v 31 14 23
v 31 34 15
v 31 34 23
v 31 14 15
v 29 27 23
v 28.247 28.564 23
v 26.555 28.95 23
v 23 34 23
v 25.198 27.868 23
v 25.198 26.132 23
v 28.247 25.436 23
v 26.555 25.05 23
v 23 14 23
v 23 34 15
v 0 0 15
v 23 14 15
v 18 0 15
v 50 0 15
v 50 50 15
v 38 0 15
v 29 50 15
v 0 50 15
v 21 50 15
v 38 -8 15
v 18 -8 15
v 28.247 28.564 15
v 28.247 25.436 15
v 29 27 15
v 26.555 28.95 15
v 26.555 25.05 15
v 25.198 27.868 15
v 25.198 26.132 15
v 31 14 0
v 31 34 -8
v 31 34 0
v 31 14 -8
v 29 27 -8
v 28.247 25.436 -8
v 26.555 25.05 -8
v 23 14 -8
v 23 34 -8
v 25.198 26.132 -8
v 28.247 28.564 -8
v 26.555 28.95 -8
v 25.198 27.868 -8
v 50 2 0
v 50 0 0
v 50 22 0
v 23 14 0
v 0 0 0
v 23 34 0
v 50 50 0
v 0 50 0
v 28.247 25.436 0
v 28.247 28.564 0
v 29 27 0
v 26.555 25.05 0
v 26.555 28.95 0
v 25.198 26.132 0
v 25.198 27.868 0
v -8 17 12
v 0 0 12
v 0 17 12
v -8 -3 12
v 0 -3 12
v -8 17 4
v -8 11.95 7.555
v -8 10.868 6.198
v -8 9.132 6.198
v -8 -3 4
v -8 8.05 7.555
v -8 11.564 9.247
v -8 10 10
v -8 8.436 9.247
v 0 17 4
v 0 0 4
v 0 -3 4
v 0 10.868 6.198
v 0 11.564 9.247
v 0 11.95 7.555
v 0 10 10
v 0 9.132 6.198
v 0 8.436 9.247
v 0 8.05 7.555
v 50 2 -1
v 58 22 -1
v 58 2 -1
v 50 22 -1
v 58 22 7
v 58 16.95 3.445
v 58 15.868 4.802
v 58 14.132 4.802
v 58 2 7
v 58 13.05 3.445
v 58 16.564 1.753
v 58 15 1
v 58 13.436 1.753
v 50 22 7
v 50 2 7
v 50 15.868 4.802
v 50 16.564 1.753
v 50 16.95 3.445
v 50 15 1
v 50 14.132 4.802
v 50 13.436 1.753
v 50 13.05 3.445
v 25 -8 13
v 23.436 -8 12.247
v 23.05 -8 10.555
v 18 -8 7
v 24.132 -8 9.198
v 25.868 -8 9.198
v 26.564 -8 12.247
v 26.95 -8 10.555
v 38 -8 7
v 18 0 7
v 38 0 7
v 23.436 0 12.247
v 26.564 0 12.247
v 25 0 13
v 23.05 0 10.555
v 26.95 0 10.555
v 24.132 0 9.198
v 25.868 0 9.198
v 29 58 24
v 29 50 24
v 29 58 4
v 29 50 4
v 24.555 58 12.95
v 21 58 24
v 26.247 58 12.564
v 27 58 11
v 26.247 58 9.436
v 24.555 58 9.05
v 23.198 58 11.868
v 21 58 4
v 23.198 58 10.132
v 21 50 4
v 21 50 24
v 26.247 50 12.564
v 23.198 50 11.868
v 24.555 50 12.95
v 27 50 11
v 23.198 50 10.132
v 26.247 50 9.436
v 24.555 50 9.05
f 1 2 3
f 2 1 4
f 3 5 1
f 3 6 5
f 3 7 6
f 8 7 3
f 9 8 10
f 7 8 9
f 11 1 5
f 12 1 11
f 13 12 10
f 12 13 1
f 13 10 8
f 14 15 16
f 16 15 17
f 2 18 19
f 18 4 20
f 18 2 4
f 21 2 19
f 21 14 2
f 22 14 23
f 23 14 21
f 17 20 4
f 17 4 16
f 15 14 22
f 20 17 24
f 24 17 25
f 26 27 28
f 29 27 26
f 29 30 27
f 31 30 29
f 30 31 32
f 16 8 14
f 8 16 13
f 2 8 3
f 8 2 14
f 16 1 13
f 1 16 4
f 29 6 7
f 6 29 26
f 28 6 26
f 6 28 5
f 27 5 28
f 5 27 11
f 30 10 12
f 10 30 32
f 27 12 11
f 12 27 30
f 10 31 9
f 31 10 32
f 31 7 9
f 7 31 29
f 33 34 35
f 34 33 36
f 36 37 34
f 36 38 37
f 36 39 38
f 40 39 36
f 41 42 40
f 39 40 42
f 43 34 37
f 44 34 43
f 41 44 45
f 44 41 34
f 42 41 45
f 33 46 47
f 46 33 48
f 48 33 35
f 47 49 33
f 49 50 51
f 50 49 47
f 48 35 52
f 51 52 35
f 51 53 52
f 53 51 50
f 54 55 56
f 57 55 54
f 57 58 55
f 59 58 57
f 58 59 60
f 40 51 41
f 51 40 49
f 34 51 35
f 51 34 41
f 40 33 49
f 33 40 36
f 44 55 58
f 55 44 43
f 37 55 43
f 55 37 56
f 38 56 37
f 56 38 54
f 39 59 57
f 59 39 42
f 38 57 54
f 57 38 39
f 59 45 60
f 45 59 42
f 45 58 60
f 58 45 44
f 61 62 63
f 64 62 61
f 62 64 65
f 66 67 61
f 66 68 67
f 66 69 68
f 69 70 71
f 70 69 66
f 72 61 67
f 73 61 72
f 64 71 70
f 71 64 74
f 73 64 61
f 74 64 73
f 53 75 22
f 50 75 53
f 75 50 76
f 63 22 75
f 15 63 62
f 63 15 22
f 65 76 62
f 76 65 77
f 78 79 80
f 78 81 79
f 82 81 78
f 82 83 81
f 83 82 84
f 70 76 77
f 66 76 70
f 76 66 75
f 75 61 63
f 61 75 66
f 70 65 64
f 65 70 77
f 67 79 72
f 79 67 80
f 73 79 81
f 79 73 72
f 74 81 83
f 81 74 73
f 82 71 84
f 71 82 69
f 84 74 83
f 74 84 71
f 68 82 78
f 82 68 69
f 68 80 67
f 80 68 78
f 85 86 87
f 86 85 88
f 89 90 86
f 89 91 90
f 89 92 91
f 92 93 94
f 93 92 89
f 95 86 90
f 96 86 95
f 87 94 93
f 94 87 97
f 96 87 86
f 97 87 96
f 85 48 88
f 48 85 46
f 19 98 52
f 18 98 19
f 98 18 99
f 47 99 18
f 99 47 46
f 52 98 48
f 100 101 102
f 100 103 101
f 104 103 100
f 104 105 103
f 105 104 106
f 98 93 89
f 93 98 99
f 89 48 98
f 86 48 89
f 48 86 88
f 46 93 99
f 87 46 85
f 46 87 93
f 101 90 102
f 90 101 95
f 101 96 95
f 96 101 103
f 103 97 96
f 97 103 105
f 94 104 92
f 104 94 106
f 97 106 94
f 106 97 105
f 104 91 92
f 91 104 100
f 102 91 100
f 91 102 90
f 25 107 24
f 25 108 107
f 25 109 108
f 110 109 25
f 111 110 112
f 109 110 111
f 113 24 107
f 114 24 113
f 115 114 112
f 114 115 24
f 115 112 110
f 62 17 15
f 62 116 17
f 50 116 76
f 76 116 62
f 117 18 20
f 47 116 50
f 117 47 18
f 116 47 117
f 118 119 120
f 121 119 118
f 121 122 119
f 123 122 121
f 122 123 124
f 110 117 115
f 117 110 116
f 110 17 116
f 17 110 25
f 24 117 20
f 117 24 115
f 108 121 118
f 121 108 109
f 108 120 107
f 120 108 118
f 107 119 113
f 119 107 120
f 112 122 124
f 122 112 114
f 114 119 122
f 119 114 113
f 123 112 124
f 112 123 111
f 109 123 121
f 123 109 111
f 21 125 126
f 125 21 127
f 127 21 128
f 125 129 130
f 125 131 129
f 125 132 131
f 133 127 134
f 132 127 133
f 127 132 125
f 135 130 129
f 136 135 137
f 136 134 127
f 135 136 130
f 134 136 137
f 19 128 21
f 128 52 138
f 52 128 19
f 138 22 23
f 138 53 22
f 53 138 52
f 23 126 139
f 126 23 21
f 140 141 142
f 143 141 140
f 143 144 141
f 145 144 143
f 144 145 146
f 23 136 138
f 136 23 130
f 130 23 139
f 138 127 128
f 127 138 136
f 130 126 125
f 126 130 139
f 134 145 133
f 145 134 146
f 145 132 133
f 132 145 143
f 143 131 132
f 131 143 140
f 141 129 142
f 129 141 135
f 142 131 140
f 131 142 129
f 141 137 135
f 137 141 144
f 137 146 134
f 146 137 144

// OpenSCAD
union(){union(){union(){union(){union(){union(){color(alpha = 0.392, c = [0.784, 0.784, 0.784]){cube(size = [50, 50, 15]);
}
}
}
}
}
}
translate(v = [23, 14, 15])
difference(){color(alpha = 1.000, c = [0.706, 0.706, 0.706]){cube(size = [8, 20, 8]);
}
color(alpha = 1.000, c = [0.510, 0.510, 0.510]){translate(v = [4, 13])
rotate(a = [0, 0, 0])
cylinder(h = 8, r = 2.000);
}
}
translate(v = [23, 14])
mirror(v = [0, 0, 1])
rotate(a = [0, 0, 0])
difference(){color(alpha = 1.000, c = [0.706, 0.706, 0.706]){cube(size = [8, 20, 8]);
}
color(alpha = 1.000, c = [0.510, 0.510, 0.510]){translate(v = [4, 13])
rotate(a = [0, 0, 0])
cylinder(h = 8, r = 2.000);
}
}
translate(v = [0, -3, 4])
rotate(a = [0, -90, 0])
difference(){color(alpha = 1.000, c = [0.706, 0.706, 0.706]){cube(size = [8, 20, 8]);
}
color(alpha = 1.000, c = [0.510, 0.510, 0.510]){translate(v = [4, 13])
rotate(a = [0, 0, 0])
cylinder(h = 8, r = 2.000);
}
}
translate(v = [50, 2, 7])
rotate(a = [0, 90, 0])
difference(){color(alpha = 1.000, c = [0.706, 0.706, 0.706]){cube(size = [8, 20, 8]);
}
color(alpha = 1.000, c = [0.510, 0.510, 0.510]){translate(v = [4, 13])
rotate(a = [0, 0, 0])
cylinder(h = 8, r = 2.000);
}
}
translate(v = [21, 0, -2])
rotate(a = [90, 0, 0])
translate(v = [4, 13])
rotate(a = [0, 0, 90])
translate(v = [-4, -13])
difference(){color(alpha = 1.000, c = [0.706, 0.706, 0.706]){cube(size = [8, 20, 8]);
}
color(alpha = 1.000, c = [0.510, 0.510, 0.510]){translate(v = [4, 13])
rotate(a = [0, 0, 0])
cylinder(h = 8, r = 2.000);
}
}
translate(v = [21, 50, 24])
rotate(a = [-90, 0, 0])
difference(){color(alpha = 1.000, c = [0.706, 0.706, 0.706]){cube(size = [8, 20, 8]);
}
color(alpha = 1.000, c = [0.510, 0.510, 0.510]){translate(v = [4, 13])
rotate(a = [0, 0, 0])
cylinder(h = 8, r = 2.000);
}
}
}
